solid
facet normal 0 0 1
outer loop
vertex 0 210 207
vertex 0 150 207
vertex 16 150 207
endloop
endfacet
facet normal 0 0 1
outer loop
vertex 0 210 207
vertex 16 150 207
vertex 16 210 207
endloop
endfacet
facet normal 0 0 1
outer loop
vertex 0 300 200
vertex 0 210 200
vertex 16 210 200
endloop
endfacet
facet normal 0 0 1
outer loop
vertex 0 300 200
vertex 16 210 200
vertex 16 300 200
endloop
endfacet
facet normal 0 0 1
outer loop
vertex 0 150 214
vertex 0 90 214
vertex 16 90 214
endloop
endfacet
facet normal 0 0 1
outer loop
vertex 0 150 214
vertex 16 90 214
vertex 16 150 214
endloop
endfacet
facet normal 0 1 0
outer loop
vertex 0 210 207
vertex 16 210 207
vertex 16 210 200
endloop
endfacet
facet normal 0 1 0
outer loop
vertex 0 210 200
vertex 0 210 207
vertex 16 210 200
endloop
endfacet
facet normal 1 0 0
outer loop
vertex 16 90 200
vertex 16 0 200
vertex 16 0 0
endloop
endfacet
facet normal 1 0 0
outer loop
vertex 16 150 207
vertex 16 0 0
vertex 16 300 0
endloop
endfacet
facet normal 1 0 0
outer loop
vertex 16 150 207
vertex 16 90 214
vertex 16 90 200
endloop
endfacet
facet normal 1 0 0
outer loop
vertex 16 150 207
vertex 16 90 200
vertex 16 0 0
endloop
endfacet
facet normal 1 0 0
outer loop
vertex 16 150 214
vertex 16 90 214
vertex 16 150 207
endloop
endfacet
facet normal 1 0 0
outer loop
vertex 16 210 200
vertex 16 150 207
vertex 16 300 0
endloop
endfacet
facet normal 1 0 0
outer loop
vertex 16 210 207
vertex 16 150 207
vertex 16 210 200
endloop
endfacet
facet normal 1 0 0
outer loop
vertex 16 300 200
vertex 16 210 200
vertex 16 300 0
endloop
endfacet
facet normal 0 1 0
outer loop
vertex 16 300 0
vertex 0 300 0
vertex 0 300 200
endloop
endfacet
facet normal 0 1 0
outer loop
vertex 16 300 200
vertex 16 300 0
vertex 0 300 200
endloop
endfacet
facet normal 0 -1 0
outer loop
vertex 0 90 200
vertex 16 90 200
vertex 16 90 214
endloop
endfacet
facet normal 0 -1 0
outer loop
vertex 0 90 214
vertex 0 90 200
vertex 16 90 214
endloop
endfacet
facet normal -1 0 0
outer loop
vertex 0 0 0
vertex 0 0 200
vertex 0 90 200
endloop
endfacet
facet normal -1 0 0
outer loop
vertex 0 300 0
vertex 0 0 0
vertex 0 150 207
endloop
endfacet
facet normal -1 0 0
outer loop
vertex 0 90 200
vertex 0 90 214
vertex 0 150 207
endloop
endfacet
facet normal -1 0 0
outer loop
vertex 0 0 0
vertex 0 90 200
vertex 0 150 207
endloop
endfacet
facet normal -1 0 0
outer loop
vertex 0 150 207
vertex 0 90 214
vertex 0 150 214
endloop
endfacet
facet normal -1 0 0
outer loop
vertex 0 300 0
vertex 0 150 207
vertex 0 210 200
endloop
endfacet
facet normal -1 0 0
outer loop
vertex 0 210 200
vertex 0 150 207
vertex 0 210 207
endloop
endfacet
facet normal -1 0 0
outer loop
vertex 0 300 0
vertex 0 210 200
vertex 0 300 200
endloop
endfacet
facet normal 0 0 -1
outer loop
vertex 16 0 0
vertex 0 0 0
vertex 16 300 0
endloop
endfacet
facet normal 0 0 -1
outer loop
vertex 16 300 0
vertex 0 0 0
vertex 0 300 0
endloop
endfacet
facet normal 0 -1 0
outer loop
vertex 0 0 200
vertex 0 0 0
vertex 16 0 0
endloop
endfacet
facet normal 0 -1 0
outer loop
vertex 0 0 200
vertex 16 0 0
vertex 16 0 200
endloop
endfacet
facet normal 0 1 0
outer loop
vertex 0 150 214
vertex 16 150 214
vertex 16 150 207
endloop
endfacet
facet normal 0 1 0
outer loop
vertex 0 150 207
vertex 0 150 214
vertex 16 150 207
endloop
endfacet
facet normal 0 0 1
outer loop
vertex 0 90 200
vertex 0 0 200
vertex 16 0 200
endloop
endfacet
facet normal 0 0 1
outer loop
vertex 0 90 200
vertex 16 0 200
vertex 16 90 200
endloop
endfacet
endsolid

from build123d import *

# Parameters (mm, degrees)
F0_W     = 300
F0_H     = 200
F1_DEPTH = 16
F3_DEPTH = 16


with BuildPart() as f1:
    # F0 (on Right) → F1 (new body)
    with BuildSketch(Plane.YZ):
        with Locations((150, 100)):
            Rectangle(F0_W, F0_H)
    extrude(amount=F1_DEPTH)

    # F2 (on face) → F3 (join)
    with BuildSketch(Plane(origin=(0, 0, 0), x_dir=(0, -1, 0), z_dir=(-1, 0, 0))):
        Polygon((-210, 207), (-210, 200), (-90, 200), (-90, 214), (-150, 214), (-150, 207), align=None)
    extrude(amount=-F3_DEPTH)


solid = f1.part
